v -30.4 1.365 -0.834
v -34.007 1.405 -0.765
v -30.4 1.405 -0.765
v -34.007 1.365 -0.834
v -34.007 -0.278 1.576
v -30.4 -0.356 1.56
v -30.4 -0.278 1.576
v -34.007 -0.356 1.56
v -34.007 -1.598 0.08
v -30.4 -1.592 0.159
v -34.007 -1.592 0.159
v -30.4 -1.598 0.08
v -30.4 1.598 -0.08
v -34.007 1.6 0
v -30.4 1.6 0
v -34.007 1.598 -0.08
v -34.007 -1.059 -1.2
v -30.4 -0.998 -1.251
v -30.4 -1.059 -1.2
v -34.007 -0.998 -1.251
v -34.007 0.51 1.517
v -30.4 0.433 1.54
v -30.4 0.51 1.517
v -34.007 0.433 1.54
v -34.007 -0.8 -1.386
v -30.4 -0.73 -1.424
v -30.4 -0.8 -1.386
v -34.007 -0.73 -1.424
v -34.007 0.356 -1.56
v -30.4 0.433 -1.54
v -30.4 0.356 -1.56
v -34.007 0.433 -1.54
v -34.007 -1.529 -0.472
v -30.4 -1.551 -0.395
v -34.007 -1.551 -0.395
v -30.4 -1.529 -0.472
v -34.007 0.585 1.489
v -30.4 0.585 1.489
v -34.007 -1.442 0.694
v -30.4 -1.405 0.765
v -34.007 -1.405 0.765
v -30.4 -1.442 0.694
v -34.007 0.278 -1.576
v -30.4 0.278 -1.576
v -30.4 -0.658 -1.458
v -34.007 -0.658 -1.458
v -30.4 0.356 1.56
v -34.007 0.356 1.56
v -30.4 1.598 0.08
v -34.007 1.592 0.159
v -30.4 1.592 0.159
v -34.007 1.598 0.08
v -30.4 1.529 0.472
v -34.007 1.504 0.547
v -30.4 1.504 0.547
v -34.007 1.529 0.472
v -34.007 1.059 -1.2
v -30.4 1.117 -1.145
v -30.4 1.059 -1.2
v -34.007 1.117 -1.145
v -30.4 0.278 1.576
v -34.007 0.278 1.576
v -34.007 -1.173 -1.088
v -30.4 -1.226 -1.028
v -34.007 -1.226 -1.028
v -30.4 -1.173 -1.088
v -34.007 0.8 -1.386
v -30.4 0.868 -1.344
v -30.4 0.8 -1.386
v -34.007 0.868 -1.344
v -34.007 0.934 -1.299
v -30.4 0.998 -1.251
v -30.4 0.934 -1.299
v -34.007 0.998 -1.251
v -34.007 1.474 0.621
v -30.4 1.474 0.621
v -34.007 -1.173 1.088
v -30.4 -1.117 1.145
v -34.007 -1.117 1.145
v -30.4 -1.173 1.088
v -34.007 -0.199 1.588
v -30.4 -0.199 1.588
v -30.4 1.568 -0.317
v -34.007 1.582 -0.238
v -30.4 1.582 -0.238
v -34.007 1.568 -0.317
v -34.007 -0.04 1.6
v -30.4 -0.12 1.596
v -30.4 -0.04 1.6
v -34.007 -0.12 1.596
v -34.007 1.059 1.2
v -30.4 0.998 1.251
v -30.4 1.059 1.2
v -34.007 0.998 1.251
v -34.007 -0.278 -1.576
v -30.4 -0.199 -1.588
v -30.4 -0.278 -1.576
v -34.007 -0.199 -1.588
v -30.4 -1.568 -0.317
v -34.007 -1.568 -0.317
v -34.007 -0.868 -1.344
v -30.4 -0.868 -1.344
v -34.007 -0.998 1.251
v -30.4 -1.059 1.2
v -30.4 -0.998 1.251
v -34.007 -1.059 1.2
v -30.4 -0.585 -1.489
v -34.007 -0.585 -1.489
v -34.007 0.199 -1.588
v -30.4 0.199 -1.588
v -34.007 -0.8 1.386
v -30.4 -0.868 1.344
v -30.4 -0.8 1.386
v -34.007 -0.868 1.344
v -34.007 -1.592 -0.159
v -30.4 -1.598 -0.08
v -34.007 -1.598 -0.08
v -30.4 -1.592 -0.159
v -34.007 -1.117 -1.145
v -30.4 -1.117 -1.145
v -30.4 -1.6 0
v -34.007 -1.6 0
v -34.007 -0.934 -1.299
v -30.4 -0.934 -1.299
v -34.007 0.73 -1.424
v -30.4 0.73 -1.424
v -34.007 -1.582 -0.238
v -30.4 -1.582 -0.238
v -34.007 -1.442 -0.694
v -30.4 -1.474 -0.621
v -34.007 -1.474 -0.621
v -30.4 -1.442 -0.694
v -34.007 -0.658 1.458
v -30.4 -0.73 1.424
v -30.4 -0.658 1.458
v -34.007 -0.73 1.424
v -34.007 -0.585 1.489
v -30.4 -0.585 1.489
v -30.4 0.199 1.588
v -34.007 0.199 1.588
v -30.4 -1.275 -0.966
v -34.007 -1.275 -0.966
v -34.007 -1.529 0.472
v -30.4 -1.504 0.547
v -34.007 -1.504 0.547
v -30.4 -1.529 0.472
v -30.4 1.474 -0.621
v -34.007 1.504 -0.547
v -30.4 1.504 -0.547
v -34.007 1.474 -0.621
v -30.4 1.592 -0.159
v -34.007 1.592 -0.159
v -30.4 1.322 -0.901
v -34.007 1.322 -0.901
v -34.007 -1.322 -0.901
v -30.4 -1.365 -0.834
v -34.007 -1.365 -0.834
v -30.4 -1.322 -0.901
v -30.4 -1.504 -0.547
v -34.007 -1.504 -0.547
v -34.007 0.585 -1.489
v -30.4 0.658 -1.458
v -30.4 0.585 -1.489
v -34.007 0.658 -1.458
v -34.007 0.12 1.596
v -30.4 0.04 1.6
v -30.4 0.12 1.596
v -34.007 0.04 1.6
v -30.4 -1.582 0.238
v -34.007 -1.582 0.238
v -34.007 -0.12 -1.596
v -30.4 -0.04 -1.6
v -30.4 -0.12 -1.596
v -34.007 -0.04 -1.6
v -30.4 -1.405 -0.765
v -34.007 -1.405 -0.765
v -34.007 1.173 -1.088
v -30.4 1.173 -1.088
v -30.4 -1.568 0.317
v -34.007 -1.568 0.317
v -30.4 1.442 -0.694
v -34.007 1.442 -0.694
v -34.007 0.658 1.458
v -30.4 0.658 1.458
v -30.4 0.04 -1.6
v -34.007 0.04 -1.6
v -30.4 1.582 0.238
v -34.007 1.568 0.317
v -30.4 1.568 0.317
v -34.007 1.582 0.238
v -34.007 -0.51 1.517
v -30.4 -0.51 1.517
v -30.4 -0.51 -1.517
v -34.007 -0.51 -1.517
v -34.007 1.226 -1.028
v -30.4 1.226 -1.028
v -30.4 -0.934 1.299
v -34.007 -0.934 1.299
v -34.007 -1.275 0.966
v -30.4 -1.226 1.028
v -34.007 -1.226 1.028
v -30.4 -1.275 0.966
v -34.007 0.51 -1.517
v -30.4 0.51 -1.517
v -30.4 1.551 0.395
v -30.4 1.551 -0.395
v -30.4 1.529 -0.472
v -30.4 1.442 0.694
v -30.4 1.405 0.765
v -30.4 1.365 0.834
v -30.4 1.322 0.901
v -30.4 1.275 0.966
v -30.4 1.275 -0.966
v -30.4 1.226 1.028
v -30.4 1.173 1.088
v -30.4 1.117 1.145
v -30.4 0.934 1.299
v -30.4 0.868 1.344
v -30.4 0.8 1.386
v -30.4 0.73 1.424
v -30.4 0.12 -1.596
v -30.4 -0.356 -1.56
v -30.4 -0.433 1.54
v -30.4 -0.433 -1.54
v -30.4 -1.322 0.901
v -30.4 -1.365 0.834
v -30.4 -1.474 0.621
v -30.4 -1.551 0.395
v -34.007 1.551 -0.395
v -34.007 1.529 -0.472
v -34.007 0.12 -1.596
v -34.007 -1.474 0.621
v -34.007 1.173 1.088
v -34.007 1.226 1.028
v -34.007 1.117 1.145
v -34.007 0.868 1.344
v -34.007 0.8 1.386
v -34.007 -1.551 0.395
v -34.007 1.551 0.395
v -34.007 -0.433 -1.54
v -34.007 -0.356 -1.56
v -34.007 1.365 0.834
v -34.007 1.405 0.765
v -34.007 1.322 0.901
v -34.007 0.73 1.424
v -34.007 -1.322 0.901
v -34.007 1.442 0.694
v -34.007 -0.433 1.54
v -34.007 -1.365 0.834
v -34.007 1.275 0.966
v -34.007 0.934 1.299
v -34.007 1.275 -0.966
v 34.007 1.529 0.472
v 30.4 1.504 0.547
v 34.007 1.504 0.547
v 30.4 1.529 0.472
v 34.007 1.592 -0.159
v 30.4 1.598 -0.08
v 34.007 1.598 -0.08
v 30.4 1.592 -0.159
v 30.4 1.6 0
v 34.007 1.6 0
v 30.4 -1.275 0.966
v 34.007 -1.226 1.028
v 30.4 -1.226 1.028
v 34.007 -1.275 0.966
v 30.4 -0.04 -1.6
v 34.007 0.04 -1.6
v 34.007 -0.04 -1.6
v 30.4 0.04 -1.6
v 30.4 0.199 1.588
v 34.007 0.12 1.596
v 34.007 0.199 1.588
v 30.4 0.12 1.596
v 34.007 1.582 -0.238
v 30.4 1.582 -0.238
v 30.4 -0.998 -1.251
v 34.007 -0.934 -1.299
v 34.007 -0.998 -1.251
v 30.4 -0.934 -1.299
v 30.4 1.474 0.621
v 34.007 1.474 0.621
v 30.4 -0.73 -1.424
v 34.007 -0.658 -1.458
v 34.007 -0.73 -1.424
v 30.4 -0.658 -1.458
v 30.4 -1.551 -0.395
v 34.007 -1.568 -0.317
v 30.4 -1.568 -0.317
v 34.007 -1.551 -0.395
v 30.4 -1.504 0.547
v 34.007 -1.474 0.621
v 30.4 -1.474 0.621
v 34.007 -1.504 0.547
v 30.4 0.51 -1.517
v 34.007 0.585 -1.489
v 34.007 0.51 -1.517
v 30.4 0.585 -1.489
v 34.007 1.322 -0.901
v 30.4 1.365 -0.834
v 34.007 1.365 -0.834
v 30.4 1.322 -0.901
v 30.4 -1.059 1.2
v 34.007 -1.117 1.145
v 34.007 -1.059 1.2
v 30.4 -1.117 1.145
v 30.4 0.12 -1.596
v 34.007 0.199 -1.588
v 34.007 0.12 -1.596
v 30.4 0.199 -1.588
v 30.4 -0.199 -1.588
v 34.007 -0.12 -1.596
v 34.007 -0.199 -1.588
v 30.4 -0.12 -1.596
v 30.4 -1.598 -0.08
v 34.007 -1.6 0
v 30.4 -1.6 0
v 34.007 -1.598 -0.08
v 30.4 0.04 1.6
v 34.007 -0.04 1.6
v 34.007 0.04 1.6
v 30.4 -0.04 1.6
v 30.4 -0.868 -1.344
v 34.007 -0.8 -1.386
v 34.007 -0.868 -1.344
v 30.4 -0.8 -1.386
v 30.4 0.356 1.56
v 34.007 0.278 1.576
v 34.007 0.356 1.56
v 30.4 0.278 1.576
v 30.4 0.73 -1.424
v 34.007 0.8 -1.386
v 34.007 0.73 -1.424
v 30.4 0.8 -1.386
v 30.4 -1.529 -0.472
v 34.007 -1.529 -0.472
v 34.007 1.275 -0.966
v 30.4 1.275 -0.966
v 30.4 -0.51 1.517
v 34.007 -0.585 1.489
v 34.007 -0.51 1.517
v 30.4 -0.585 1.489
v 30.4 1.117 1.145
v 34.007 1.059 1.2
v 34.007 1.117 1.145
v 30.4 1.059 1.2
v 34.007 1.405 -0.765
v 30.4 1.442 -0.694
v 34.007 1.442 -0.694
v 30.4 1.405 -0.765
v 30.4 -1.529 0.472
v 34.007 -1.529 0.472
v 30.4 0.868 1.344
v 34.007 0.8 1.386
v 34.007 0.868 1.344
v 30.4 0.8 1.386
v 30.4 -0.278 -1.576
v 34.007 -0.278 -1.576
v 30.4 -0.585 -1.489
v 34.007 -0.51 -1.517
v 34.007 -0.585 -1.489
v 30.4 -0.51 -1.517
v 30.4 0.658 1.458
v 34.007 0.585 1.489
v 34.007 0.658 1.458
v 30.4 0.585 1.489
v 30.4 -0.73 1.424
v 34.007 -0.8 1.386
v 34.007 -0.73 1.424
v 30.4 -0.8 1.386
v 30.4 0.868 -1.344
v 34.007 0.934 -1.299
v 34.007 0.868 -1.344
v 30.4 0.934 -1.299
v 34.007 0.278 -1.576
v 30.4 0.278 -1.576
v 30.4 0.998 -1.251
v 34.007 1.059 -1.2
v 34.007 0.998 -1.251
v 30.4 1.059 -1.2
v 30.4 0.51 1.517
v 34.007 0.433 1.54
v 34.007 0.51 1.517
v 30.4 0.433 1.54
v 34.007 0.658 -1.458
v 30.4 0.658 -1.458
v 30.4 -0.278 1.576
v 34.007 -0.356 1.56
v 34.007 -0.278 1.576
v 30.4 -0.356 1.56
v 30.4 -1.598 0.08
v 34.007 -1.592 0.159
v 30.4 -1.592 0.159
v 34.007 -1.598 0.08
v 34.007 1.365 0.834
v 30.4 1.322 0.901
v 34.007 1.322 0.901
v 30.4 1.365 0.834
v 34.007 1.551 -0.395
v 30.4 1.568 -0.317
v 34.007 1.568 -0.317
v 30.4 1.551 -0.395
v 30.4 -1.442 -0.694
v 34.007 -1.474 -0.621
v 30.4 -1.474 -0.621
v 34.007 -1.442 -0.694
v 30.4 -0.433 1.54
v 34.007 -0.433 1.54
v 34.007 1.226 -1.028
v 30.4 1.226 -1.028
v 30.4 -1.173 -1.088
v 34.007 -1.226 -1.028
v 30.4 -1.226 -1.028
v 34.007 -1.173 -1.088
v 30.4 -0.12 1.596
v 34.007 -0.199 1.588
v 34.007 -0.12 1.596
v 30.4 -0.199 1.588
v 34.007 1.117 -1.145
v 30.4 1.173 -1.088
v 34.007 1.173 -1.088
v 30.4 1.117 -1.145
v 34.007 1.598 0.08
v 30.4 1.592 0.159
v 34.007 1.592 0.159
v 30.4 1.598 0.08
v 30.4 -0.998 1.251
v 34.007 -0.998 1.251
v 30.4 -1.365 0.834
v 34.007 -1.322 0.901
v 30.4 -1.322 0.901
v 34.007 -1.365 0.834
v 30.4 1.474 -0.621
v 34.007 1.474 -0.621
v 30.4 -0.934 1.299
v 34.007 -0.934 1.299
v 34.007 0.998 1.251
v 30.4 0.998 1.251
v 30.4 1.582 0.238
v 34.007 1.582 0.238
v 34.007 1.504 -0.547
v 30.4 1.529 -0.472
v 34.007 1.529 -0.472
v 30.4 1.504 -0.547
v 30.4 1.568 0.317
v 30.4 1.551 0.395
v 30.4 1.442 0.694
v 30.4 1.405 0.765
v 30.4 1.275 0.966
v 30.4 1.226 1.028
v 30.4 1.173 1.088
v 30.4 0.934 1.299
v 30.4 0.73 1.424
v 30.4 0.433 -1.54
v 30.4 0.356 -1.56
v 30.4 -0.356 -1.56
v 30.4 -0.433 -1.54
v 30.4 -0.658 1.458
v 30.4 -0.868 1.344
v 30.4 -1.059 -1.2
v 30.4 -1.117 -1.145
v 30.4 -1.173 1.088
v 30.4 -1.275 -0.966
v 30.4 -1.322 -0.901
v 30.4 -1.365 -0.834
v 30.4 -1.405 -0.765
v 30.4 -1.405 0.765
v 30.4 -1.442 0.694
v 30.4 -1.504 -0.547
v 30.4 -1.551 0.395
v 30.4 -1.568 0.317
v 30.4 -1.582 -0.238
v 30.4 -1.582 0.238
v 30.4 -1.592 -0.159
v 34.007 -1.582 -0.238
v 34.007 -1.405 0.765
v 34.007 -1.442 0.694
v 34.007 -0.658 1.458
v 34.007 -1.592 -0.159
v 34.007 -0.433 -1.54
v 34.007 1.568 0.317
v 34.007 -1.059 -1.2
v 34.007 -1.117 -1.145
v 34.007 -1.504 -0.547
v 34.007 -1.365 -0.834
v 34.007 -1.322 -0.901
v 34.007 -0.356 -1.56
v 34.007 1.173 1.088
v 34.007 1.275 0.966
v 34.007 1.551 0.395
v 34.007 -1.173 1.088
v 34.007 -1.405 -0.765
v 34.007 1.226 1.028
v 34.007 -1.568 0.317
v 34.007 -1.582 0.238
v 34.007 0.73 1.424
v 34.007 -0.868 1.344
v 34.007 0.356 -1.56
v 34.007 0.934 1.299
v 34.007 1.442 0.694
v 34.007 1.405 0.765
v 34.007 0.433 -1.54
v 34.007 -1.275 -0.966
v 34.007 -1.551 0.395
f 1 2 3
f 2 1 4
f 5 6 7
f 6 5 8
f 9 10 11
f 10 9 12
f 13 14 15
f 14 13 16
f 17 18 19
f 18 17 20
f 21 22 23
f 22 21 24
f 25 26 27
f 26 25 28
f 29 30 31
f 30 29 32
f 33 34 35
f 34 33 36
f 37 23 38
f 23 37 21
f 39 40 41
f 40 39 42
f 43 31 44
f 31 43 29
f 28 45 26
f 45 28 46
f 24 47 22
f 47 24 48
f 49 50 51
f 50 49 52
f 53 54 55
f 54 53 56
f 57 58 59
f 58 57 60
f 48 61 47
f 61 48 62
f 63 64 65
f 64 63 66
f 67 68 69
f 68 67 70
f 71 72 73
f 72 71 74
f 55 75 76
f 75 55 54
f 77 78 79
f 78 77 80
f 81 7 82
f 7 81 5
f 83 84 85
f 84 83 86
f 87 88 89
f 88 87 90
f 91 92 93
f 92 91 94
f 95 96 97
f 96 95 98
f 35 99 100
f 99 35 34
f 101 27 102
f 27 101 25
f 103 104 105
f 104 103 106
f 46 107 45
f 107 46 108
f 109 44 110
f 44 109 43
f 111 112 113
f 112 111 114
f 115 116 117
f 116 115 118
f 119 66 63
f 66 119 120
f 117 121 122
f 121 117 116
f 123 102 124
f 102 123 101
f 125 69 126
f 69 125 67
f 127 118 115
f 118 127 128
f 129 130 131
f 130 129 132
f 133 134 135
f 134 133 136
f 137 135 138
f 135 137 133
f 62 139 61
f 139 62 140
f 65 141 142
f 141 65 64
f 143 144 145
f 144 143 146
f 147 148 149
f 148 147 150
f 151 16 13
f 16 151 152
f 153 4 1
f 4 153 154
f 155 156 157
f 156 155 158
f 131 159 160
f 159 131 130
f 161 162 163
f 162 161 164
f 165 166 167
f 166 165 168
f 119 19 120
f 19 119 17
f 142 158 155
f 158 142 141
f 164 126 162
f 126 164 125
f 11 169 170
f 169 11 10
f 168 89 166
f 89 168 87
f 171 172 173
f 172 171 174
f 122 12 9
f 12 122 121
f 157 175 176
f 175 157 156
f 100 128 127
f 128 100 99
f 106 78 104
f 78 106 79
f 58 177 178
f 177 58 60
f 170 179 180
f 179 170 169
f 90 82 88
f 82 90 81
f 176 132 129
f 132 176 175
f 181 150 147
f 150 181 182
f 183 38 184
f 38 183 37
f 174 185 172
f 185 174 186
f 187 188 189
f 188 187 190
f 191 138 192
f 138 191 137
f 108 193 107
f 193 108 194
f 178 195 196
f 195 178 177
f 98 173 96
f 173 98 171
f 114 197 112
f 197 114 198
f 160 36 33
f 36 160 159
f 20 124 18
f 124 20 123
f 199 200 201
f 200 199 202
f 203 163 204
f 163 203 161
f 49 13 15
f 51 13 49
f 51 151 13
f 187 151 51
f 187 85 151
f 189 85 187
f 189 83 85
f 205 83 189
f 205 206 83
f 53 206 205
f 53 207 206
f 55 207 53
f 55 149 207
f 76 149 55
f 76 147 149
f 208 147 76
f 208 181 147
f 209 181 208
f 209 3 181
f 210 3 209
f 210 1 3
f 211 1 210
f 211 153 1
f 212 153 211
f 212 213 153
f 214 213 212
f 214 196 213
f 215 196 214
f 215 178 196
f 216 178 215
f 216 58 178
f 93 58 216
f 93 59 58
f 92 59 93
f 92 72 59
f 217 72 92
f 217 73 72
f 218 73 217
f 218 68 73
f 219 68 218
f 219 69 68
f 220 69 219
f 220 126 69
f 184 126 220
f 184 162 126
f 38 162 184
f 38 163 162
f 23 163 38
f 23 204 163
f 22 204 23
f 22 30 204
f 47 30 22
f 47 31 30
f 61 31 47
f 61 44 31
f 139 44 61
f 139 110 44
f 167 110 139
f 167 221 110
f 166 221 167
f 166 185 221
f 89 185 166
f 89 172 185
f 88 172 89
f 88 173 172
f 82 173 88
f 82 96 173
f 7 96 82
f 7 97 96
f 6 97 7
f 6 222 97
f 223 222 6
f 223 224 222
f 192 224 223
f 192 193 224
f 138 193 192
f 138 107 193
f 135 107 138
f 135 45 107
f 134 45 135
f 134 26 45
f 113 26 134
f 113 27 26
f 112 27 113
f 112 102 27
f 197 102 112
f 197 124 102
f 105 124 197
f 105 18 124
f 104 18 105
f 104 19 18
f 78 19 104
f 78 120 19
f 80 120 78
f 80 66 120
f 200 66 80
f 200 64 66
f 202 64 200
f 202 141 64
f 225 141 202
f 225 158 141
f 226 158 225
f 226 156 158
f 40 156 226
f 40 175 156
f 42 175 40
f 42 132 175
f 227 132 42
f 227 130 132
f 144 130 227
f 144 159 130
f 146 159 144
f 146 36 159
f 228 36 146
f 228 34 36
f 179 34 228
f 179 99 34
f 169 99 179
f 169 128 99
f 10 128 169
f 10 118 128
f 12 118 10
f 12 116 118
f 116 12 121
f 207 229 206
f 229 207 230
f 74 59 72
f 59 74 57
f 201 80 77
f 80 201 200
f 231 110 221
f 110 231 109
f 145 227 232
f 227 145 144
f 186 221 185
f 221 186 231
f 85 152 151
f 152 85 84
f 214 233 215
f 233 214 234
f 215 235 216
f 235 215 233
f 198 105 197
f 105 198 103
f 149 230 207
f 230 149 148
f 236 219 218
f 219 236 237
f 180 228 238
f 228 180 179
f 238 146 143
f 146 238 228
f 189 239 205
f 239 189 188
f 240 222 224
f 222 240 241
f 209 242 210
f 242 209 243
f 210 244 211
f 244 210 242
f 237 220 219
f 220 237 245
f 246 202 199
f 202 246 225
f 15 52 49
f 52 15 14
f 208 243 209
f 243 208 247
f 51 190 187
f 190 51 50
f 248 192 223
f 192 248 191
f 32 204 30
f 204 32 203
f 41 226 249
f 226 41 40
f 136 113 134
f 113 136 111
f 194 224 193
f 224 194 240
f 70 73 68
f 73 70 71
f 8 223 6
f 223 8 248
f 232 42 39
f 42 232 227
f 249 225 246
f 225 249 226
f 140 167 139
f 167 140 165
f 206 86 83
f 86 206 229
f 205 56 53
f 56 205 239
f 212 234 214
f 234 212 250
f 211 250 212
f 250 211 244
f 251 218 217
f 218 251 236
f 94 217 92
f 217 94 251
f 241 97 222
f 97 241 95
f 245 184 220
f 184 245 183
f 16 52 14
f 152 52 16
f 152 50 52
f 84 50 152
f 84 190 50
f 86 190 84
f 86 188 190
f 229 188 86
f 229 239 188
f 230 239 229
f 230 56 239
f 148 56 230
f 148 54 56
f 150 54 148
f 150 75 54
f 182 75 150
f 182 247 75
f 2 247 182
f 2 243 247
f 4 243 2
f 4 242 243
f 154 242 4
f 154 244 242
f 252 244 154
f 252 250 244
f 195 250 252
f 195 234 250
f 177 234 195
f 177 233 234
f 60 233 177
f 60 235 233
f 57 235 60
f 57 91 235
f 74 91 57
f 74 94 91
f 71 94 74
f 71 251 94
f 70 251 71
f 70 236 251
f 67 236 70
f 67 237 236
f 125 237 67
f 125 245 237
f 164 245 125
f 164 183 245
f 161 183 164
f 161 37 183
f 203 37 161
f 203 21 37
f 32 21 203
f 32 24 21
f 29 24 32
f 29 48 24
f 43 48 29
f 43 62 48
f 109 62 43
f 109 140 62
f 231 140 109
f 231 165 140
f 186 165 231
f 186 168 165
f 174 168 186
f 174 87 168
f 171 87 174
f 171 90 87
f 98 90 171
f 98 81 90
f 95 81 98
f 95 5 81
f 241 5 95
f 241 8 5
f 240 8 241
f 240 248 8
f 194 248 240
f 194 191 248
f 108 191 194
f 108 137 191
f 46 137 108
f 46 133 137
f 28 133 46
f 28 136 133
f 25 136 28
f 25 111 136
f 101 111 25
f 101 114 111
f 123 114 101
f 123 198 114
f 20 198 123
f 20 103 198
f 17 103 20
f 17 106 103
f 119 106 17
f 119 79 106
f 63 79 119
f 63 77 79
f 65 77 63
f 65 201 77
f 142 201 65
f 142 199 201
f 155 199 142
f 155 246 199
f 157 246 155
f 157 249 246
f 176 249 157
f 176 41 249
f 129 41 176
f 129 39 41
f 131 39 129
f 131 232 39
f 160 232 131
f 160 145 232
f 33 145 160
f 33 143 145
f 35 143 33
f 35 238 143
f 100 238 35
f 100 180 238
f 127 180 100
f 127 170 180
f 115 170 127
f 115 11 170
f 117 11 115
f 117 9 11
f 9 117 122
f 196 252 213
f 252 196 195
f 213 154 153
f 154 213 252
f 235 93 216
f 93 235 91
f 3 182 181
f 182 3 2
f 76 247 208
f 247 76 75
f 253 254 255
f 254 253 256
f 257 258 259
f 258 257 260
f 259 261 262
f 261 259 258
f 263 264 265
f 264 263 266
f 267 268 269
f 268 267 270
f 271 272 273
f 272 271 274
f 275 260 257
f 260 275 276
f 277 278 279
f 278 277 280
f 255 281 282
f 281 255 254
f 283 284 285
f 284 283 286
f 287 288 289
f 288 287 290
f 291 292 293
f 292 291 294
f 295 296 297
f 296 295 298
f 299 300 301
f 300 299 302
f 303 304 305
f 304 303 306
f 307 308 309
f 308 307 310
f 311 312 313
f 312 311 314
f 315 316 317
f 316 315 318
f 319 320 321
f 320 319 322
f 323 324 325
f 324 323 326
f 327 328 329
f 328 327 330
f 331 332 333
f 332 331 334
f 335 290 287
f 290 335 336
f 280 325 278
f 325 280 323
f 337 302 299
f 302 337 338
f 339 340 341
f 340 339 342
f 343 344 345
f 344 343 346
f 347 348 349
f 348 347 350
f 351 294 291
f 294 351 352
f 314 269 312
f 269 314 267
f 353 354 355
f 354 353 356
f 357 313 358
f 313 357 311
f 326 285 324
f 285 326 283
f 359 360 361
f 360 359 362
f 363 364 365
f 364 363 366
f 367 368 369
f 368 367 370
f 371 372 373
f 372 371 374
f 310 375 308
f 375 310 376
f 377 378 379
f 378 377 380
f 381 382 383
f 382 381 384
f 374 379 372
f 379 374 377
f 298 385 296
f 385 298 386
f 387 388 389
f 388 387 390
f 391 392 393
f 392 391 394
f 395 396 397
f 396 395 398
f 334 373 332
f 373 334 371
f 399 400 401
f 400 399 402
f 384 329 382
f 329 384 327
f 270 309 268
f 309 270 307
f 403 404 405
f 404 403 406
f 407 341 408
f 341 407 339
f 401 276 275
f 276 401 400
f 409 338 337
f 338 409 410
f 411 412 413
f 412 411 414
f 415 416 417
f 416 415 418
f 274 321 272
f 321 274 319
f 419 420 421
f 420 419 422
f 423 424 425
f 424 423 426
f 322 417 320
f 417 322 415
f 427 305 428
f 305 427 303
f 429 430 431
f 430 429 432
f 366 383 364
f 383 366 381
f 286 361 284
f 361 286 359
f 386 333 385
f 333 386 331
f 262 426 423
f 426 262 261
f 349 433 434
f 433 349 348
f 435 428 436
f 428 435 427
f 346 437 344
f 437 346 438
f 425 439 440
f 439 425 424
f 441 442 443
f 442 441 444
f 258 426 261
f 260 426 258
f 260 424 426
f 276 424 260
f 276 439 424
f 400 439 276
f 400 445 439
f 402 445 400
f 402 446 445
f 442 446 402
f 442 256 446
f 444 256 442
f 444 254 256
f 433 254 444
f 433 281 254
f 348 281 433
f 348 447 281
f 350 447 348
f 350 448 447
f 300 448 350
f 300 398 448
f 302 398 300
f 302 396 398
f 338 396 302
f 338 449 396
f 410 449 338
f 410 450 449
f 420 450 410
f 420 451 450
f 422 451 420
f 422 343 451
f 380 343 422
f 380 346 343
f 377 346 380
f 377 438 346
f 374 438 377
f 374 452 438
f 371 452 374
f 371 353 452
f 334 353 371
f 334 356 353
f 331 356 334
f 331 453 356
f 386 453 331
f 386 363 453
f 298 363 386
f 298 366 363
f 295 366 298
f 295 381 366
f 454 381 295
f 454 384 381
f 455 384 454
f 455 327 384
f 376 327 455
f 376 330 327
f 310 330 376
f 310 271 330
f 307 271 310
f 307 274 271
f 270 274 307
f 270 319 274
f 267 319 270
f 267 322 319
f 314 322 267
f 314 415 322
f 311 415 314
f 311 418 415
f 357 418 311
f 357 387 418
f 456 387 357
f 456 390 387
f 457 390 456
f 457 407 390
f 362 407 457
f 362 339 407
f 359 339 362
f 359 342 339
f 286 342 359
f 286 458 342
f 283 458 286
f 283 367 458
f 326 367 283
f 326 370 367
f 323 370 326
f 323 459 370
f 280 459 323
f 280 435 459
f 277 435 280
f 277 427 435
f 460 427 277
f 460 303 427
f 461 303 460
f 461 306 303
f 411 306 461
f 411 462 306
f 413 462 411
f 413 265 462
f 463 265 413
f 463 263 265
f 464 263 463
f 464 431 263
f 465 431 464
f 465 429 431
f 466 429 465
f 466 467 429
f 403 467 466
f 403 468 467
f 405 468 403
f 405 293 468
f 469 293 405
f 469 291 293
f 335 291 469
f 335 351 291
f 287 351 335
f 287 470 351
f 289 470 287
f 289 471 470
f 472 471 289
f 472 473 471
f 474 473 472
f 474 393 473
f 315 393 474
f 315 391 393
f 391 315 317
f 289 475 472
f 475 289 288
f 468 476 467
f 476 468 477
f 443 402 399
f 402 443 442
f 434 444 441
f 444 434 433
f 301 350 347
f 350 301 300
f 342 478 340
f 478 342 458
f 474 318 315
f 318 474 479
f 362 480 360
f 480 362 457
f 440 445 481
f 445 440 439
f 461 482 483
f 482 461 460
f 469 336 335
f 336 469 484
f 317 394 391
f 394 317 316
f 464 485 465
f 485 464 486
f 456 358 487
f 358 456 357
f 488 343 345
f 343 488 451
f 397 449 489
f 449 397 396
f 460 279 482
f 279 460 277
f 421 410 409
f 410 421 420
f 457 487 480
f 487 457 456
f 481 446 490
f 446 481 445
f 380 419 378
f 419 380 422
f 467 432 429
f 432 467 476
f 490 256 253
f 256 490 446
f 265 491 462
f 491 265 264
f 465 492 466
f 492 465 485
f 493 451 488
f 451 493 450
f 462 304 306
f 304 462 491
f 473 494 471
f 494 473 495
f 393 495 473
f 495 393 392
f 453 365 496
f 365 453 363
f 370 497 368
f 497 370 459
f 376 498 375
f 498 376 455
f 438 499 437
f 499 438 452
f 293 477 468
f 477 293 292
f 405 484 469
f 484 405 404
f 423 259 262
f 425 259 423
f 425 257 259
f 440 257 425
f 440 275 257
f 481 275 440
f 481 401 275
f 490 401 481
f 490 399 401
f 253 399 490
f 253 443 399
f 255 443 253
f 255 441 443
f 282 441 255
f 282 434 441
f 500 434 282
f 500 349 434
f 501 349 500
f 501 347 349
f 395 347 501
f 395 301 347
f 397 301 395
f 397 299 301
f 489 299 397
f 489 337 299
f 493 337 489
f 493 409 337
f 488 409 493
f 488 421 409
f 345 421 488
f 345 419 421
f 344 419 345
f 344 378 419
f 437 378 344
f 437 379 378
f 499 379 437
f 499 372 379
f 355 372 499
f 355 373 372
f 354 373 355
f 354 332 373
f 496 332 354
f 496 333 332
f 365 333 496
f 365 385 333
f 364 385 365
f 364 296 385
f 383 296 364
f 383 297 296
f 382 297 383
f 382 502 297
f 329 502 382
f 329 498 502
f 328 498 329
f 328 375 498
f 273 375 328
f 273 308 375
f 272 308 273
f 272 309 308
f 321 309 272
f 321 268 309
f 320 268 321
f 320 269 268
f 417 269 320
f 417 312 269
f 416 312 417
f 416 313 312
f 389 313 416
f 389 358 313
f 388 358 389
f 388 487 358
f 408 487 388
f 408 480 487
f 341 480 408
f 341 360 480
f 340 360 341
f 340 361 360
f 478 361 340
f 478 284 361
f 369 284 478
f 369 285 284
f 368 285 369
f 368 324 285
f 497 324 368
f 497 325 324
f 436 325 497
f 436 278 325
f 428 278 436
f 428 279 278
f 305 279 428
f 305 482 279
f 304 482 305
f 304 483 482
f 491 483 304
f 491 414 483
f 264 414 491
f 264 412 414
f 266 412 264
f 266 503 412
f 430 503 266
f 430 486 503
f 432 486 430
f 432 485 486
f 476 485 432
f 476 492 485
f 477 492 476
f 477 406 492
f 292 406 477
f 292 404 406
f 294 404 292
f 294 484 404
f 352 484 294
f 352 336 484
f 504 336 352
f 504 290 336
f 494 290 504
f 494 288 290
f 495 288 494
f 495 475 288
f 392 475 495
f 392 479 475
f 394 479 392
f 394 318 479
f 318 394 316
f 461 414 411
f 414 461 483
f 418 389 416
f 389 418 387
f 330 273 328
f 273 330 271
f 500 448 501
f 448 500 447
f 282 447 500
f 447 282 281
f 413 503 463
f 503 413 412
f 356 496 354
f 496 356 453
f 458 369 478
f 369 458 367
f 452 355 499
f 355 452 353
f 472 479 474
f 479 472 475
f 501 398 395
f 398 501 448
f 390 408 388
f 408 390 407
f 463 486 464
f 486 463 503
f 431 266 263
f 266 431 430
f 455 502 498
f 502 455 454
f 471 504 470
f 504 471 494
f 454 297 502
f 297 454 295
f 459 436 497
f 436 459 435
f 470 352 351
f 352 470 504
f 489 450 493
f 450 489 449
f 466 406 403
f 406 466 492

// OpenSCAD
use <../lib.scad>
use <../p/1-4chrd.scad>
use <../p/1-4cyli.scad>
use <../p/1-4edge.scad>
use <../p/4-4disc.scad>
use <../p/4-4edge.scad>
use <../p/4-4ndis.scad>
use <../p/4-8sphe.scad>
use <../p/box5.scad>
use <../p/stud3.scad>
$fa=1; $fs=0.2;
function ldraw_lib__4218a(realsolid=false) = [
// 0 ~Roller Door Normal (Obsolete)
// 0 Name: 4218a.dat
// 0 Author: Jaco van der Molen [Jaco]
// 0 !LDRAW_ORG Part UPDATE 2013-02
// 0 !LICENSE Licensed under CC BY 2.0 and CC BY 4.0 : see CAreadme.txt
// 
// 0 BFC CERTIFY CCW
  [0,"BFC","CERTIFY"],
  [0,"BFC","CCW"],
// 
// 0 !CATEGORY Door
// 0 !KEYWORDS Garage, slat
// 
// 0 !HISTORY 1997-12-05 [PTadmin] Official Update 1997-17
// 0 !HISTORY 2002-07-16 [fwcain] Added keywords...
// 0 !HISTORY 2002-11-30 [PTadmin] Official Update 2002-05
// 0 !HISTORY 2007-07-04 [PTadmin] Header formatted for Contributor Agreement
// 0 !HISTORY 2008-07-01 [PTadmin] Official Update 2008-01
// 0 !HISTORY 2008-07-07 [tchang] Add BFC, partially rebuild (2008-02-24)
// 0 !HISTORY 2009-07-15 [PTadmin] Renamed from 4219 (incorrect number)
// 0 !HISTORY 2009-09-03 [PTadmin] Official Update 2009-02
// 0 !HISTORY 2013-11-17 [PTadmin] Geometry corrected in 4218b
// 0 !HISTORY 2013-12-23 [PTadmin] Official Update 2013-02
// 
// 
// 2 24 -75 23 -2 75 23 -2
  [2,24,-75,23,-2,75,23,-2],
// 2 24 -75 15 -2 -75 23 -2
  [2,24,-75,15,-2,-75,23,-2],
// 2 24 75 15 -2 75 23 -2
  [2,24,75,15,-2,75,23,-2],
// 2 24 -80 15 -2 -75 15 -2
  [2,24,-80,15,-2,-75,15,-2],
// 2 24 75 15 -2 80 15 -2
  [2,24,75,15,-2,80,15,-2],
// 2 24 80 3.382 -2 80 15 -2
  [2,24,80,3.382,-2,80,15,-2],
// 2 24 -80 3.382 -2 -80 15 -2
  [2,24,-80,3.382,-2,-80,15,-2],
// 2 24 -76 3.382 -2 -76 5 -2
  [2,24,-76,3.382,-2,-76,5,-2],
// 2 24 76 3.382 -2 76 5 -2
  [2,24,76,3.382,-2,76,5,-2],
// 2 24 -76 5 -2 76 5 -2
  [2,24,-76,5,-2,76,5,-2],
// 0
// 2 24 -75 23 2 75 23 2
  [2,24,-75,23,2,75,23,2],
// 2 24 -75 15 2 -75 23 2
  [2,24,-75,15,2,-75,23,2],
// 2 24 75 15 2 75 23 2
  [2,24,75,15,2,75,23,2],
// 2 24 -80 15 2 -75 15 2
  [2,24,-80,15,2,-75,15,2],
// 2 24 75 15 2 80 15 2
  [2,24,75,15,2,80,15,2],
// 2 24 80 3.382 2 80 15 2
  [2,24,80,3.382,2,80,15,2],
// 2 24 -80 3.382 2 -80 15 2
  [2,24,-80,3.382,2,-80,15,2],
// 2 24 -76 3.382 2 -76 5 2
  [2,24,-76,3.382,2,-76,5,2],
// 2 24 76 3.382 2 76 5 2
  [2,24,76,3.382,2,76,5,2],
// 2 24 -76 5 2 76 5 2
  [2,24,-76,5,2,76,5,2],
// 0
// 1 0 75 21 0 0 -2.8 0 1.98 0 1.98 -1.98 0 1.98 1-4edge.dat
  [1,0,75,21,0,0,-2.8,0,1.98,0,1.98,-1.98,0,1.98, ldraw_lib__1_4edge(realsolid)],
// 1 0 -75 21 0 0 -2.8 0 1.98 0 1.98 -1.98 0 1.98 1-4edge.dat
  [1,0,-75,21,0,0,-2.8,0,1.98,0,1.98,-1.98,0,1.98, ldraw_lib__1_4edge(realsolid)],
// 2 24 -75 15 -2 -75 15 2
  [2,24,-75,15,-2,-75,15,2],
// 2 24 75 15 -2 75 15 2
  [2,24,75,15,-2,75,15,2],
// 2 24 -80 15 -2 -80 15 2
  [2,24,-80,15,-2,-80,15,2],
// 2 24 80 15 -2 80 15 2
  [2,24,80,15,-2,80,15,2],
// 2 24 -76 5 -2 -76 5 2
  [2,24,-76,5,-2,-76,5,2],
// 2 24 76 5 -2 76 5 2
  [2,24,76,5,-2,76,5,2],
// 0
// 2 24 -80 3.382 -2 -76 3.382 -2
  [2,24,-80,3.382,-2,-76,3.382,-2],
// 2 24 -80 3.382 2 -76 3.382 2
  [2,24,-80,3.382,2,-76,3.382,2],
// 2 24 -80 3.6956 1.5308 -80 3.382 2
  [2,24,-80,3.6956,1.5308,-80,3.382,2],
// 2 24 -80 4 0 -80 3.6956 1.5308
  [2,24,-80,4,0,-80,3.6956,1.5308],
// 2 24 -80 3.6956 -1.5308 -80 4 0
  [2,24,-80,3.6956,-1.5308,-80,4,0],
// 2 24 -80 3.382 -2 -80 3.6956 -1.5308
  [2,24,-80,3.382,-2,-80,3.6956,-1.5308],
// 2 24 80 3.382 -2 76 3.382 -2
  [2,24,80,3.382,-2,76,3.382,-2],
// 2 24 80 3.382 2 76 3.382 2
  [2,24,80,3.382,2,76,3.382,2],
// 2 24 80 3.6956 1.5308 80 3.382 2
  [2,24,80,3.6956,1.5308,80,3.382,2],
// 2 24 80 4 0 80 3.6956 1.5308
  [2,24,80,4,0,80,3.6956,1.5308],
// 2 24 80 3.6956 -1.5308 80 4 0
  [2,24,80,3.6956,-1.5308,80,4,0],
// 2 24 80 3.382 -2 80 3.6956 -1.5308
  [2,24,80,3.382,-2,80,3.6956,-1.5308],
// 0
// 0 BFC INVERTNEXT
  [0,"BFC","INVERTNEXT"],
// 1 16 -75 19 0 0 1 0 -2 0 0 0 0 2 4-8sphe.dat
  [1,16,-75,19,0,0,1,0,-2,0,0,0,0,2, ldraw_lib__4_8sphe(realsolid)],
// 1 16 -75 19 0 0 -2 0 2 0 0 0 0 2 4-4edge.dat
  [1,16,-75,19,0,0,-2,0,2,0,0,0,0,2, ldraw_lib__4_4edge(realsolid)],
// 0 BFC INVERTNEXT
  [0,"BFC","INVERTNEXT"],
// 1 16 75 19 0 0 -1 0 -2 0 0 0 0 -2 4-8sphe.dat
  [1,16,75,19,0,0,-1,0,-2,0,0,0,0,-2, ldraw_lib__4_8sphe(realsolid)],
// 1 16 75 19 0 0 -2 0 2 0 0 0 0 2 4-4edge.dat
  [1,16,75,19,0,0,-2,0,2,0,0,0,0,2, ldraw_lib__4_4edge(realsolid)],
// 1 16 75 21 0 0 -150 0 1.98 0 1.98 -1.98 0 1.98 1-4cyli.dat
  [1,16,75,21,0,0,-150,0,1.98,0,1.98,-1.98,0,1.98, ldraw_lib__1_4cyli(realsolid)],
// 0
// 1 16 -75 21 0 0 2.8 0 1.98 0 1.98 -1.98 0 1.98 1-4chrd.dat
  [1,16,-75,21,0,0,2.8,0,1.98,0,1.98,-1.98,0,1.98, ldraw_lib__1_4chrd(realsolid)],
// 1 16 -75 19 0 0 2 0 2 0 0 0 0 2 4-4ndis.dat
  [1,16,-75,19,0,0,2,0,2,0,0,0,0,2, ldraw_lib__4_4ndis(realsolid)],
// 4 16 -75 23 2 -75 23 -2 -75 21 -2 -75 21 2
  [4,16,-75,23,2,-75,23,-2,-75,21,-2,-75,21,2],
// 4 16 -75 17 2 -75 17 -2 -75 15 -2 -75 15 2
  [4,16,-75,17,2,-75,17,-2,-75,15,-2,-75,15,2],
// 4 16 -75 15 2 -75 15 -2 -80 15 -2 -80 15 2
  [4,16,-75,15,2,-75,15,-2,-80,15,-2,-80,15,2],
// 4 16 -80 15 2 -80 15 -2 -80 3 -2 -80 3 2
  [4,16,-80,15,2,-80,15,-2,-80,3,-2,-80,3,2],
// 0
// 1 16 75 21 0 0 -2.8 0 1.98 0 1.98 -1.98 0 1.98 1-4chrd.dat
  [1,16,75,21,0,0,-2.8,0,1.98,0,1.98,-1.98,0,1.98, ldraw_lib__1_4chrd(realsolid)],
// 1 16 75 19 0 0 -2 0 2 0 0 0 0 2 4-4ndis.dat
  [1,16,75,19,0,0,-2,0,2,0,0,0,0,2, ldraw_lib__4_4ndis(realsolid)],
// 4 16 75 21 2 75 21 -2 75 23 -2 75 23 2
  [4,16,75,21,2,75,21,-2,75,23,-2,75,23,2],
// 4 16 75 15 2 75 15 -2 75 17 -2 75 17 2
  [4,16,75,15,2,75,15,-2,75,17,-2,75,17,2],
// 4 16 80 15 2 80 15 -2 75 15 -2 75 15 2
  [4,16,80,15,2,80,15,-2,75,15,-2,75,15,2],
// 4 16 80 3 2 80 3 -2 80 15 -2 80 15 2
  [4,16,80,3,2,80,3,-2,80,15,-2,80,15,2],
// 0
// 4 16 -76 4 2 -76 4 -2 -76 5 -2 -76 5 2
  [4,16,-76,4,2,-76,4,-2,-76,5,-2,-76,5,2],
// 4 16 76 5 2 76 5 -2 76 4 -2 76 4 2
  [4,16,76,5,2,76,5,-2,76,4,-2,76,4,2],
// 4 16 -76 5 -2 76 5 -2 76 5 2 -76 5 2
  [4,16,-76,5,-2,76,5,-2,76,5,2,-76,5,2],
// 0
// 3 16 -76 3.6956 1.5308 -76 4 0 -76 4 2
  [3,16,-76,3.6956,1.5308,-76,4,0,-76,4,2],
// 3 16 -76 3.382 2 -76 3.6956 1.5308 -76 4 2
  [3,16,-76,3.382,2,-76,3.6956,1.5308,-76,4,2],
// 3 16 -76 4 -2 -76 4 0 -76 3.6956 -1.5308
  [3,16,-76,4,-2,-76,4,0,-76,3.6956,-1.5308],
// 3 16 -76 4 -2 -76 3.6956 -1.5308 -76 3.382 -2
  [3,16,-76,4,-2,-76,3.6956,-1.5308,-76,3.382,-2],
// 3 16 76 4 2 76 4 0 76 3.6956 1.5308
  [3,16,76,4,2,76,4,0,76,3.6956,1.5308],
// 3 16 76 4 2 76 3.6956 1.5308 76 3.382 2
  [3,16,76,4,2,76,3.6956,1.5308,76,3.382,2],
// 3 16 76 3.6956 -1.5308 76 4 0 76 4 -2
  [3,16,76,3.6956,-1.5308,76,4,0,76,4,-2],
// 3 16 76 3.382 -2 76 3.6956 -1.5308 76 4 -2
  [3,16,76,3.382,-2,76,3.6956,-1.5308,76,4,-2],
// 0
// 1 16 -85 0 0 0 -2.25 0 1 0 0 0 0 1 stud3.dat
  [1,16,-85,0,0,0,-2.25,0,1,0,0,0,0,1, ldraw_lib__stud3(realsolid)],
// 1 16 -85 0 0 0 2.25 0 4 0 0 0 0 4 4-4disc.dat
  [1,16,-85,0,0,0,2.25,0,4,0,0,0,0,4, ldraw_lib__4_4disc(realsolid)],
// 1 16 85 0 0 0 2.25 0 1 0 0 0 0 -1 stud3.dat
  [1,16,85,0,0,0,2.25,0,1,0,0,0,0,-1, ldraw_lib__stud3(realsolid)],
// 1 16 85 0 0 0 -2.25 0 4 0 0 0 0 -4 4-4disc.dat
  [1,16,85,0,0,0,-2.25,0,4,0,0,0,0,-4, ldraw_lib__4_4disc(realsolid)],
// 1 16 -76 0 0 0 -2 0 2 0 0 0 0 2 4-4edge.dat
  [1,16,-76,0,0,0,-2,0,2,0,0,0,0,2, ldraw_lib__4_4edge(realsolid)],
// 1 16 76 0 0 0 -2 0 2 0 0 0 0 2 4-4edge.dat
  [1,16,76,0,0,0,-2,0,2,0,0,0,0,2, ldraw_lib__4_4edge(realsolid)],
// 1 16 -76 0 0 0 1 0 -2 0 0 0 0 2 4-8sphe.dat
  [1,16,-76,0,0,0,1,0,-2,0,0,0,0,2, ldraw_lib__4_8sphe(realsolid)],
// 1 16 76 0 0 0 -1 0 -2 0 0 0 0 -2 4-8sphe.dat
  [1,16,76,0,0,0,-1,0,-2,0,0,0,0,-2, ldraw_lib__4_8sphe(realsolid)],
// 0
// 0 BFC INVERTNEXT
  [0,"BFC","INVERTNEXT"],
// 1 16 -18.5 14 -2 17.5 0 0 0 0 -7 0 1 0 box5.dat
  [1,16,-18.5,14,-2,17.5,0,0,0,0,-7,0,1,0, ldraw_lib__box5(realsolid)],
// 0 BFC INVERTNEXT
  [0,"BFC","INVERTNEXT"],
// 1 16 18.5 14 -2 17.5 0 0 0 0 -7 0 1 0 box5.dat
  [1,16,18.5,14,-2,17.5,0,0,0,0,-7,0,1,0, ldraw_lib__box5(realsolid)],
// 0 BFC INVERTNEXT
  [0,"BFC","INVERTNEXT"],
// 1 16 55.5 14 -2 17.5 0 0 0 0 -7 0 1 0 box5.dat
  [1,16,55.5,14,-2,17.5,0,0,0,0,-7,0,1,0, ldraw_lib__box5(realsolid)],
// 0 BFC INVERTNEXT
  [0,"BFC","INVERTNEXT"],
// 1 16 -55.5 14 -2 17.5 0 0 0 0 -7 0 1 0 box5.dat
  [1,16,-55.5,14,-2,17.5,0,0,0,0,-7,0,1,0, ldraw_lib__box5(realsolid)],
// 0
// 4 16 -75 23 -2 75 23 -2 75 21 -2 -75 21 -2
  [4,16,-75,23,-2,75,23,-2,75,21,-2,-75,21,-2],
// 4 16 -75 7 -2 75 7 -2 75 5 -2 -75 5 -2
  [4,16,-75,7,-2,75,7,-2,75,5,-2,-75,5,-2],
// 4 16 -75 21 -2 -73 21 -2 -73 7 -2 -75 7 -2
  [4,16,-75,21,-2,-73,21,-2,-73,7,-2,-75,7,-2],
// 4 16 -38 21 -2 -36 21 -2 -36 7 -2 -38 7 -2
  [4,16,-38,21,-2,-36,21,-2,-36,7,-2,-38,7,-2],
// 4 16 -1 21 -2 1 21 -2 1 7 -2 -1 7 -2
  [4,16,-1,21,-2,1,21,-2,1,7,-2,-1,7,-2],
// 4 16 36 21 -2 38 21 -2 38 7 -2 36 7 -2
  [4,16,36,21,-2,38,21,-2,38,7,-2,36,7,-2],
// 4 16 73 21 -2 75 21 -2 75 7 -2 73 7 -2
  [4,16,73,21,-2,75,21,-2,75,7,-2,73,7,-2],
// 0
// 4 16 -80 15 -2 -75 15 -2 -75 5 -2 -80 5 -2
  [4,16,-80,15,-2,-75,15,-2,-75,5,-2,-80,5,-2],
// 4 16 75 15 -2 80 15 -2 80 5 -2 75 5 -2
  [4,16,75,15,-2,80,15,-2,80,5,-2,75,5,-2],
// 4 16 -80 5 -2 -76 5 -2 -76 3 -2 -80 3 -2
  [4,16,-80,5,-2,-76,5,-2,-76,3,-2,-80,3,-2],
// 4 16 76 5 -2 80 5 -2 80 3 -2 76 3 -2
  [4,16,76,5,-2,80,5,-2,80,3,-2,76,3,-2],
// 0
// 4 16 -75 5 2 75 5 2 75 23 2 -75 23 2
  [4,16,-75,5,2,75,5,2,75,23,2,-75,23,2],
// 4 16 -80 5 2 -75 5 2 -75 15 2 -80 15 2
  [4,16,-80,5,2,-75,5,2,-75,15,2,-80,15,2],
// 4 16 75 5 2 80 5 2 80 15 2 75 15 2
  [4,16,75,5,2,80,5,2,80,15,2,75,15,2],
// 4 16 -80 3 2 -76 3 2 -76 5 2 -80 5 2
  [4,16,-80,3,2,-76,3,2,-76,5,2,-80,5,2],
// 4 16 76 3 2 80 3 2 80 5 2 76 5 2
  [4,16,76,3,2,80,3,2,80,5,2,76,5,2],
// 0
];
module ldraw_lib__4218a(step=0, col=false, unit=2/5, alt=false, line=0.2, solid=!$preview)
    makepoly(ldraw_lib__4218a(solid), step=step, col=col, unit=unit, alt=alt, line=line, solid=solid);
ldraw_lib__4218a(line=0.2);
